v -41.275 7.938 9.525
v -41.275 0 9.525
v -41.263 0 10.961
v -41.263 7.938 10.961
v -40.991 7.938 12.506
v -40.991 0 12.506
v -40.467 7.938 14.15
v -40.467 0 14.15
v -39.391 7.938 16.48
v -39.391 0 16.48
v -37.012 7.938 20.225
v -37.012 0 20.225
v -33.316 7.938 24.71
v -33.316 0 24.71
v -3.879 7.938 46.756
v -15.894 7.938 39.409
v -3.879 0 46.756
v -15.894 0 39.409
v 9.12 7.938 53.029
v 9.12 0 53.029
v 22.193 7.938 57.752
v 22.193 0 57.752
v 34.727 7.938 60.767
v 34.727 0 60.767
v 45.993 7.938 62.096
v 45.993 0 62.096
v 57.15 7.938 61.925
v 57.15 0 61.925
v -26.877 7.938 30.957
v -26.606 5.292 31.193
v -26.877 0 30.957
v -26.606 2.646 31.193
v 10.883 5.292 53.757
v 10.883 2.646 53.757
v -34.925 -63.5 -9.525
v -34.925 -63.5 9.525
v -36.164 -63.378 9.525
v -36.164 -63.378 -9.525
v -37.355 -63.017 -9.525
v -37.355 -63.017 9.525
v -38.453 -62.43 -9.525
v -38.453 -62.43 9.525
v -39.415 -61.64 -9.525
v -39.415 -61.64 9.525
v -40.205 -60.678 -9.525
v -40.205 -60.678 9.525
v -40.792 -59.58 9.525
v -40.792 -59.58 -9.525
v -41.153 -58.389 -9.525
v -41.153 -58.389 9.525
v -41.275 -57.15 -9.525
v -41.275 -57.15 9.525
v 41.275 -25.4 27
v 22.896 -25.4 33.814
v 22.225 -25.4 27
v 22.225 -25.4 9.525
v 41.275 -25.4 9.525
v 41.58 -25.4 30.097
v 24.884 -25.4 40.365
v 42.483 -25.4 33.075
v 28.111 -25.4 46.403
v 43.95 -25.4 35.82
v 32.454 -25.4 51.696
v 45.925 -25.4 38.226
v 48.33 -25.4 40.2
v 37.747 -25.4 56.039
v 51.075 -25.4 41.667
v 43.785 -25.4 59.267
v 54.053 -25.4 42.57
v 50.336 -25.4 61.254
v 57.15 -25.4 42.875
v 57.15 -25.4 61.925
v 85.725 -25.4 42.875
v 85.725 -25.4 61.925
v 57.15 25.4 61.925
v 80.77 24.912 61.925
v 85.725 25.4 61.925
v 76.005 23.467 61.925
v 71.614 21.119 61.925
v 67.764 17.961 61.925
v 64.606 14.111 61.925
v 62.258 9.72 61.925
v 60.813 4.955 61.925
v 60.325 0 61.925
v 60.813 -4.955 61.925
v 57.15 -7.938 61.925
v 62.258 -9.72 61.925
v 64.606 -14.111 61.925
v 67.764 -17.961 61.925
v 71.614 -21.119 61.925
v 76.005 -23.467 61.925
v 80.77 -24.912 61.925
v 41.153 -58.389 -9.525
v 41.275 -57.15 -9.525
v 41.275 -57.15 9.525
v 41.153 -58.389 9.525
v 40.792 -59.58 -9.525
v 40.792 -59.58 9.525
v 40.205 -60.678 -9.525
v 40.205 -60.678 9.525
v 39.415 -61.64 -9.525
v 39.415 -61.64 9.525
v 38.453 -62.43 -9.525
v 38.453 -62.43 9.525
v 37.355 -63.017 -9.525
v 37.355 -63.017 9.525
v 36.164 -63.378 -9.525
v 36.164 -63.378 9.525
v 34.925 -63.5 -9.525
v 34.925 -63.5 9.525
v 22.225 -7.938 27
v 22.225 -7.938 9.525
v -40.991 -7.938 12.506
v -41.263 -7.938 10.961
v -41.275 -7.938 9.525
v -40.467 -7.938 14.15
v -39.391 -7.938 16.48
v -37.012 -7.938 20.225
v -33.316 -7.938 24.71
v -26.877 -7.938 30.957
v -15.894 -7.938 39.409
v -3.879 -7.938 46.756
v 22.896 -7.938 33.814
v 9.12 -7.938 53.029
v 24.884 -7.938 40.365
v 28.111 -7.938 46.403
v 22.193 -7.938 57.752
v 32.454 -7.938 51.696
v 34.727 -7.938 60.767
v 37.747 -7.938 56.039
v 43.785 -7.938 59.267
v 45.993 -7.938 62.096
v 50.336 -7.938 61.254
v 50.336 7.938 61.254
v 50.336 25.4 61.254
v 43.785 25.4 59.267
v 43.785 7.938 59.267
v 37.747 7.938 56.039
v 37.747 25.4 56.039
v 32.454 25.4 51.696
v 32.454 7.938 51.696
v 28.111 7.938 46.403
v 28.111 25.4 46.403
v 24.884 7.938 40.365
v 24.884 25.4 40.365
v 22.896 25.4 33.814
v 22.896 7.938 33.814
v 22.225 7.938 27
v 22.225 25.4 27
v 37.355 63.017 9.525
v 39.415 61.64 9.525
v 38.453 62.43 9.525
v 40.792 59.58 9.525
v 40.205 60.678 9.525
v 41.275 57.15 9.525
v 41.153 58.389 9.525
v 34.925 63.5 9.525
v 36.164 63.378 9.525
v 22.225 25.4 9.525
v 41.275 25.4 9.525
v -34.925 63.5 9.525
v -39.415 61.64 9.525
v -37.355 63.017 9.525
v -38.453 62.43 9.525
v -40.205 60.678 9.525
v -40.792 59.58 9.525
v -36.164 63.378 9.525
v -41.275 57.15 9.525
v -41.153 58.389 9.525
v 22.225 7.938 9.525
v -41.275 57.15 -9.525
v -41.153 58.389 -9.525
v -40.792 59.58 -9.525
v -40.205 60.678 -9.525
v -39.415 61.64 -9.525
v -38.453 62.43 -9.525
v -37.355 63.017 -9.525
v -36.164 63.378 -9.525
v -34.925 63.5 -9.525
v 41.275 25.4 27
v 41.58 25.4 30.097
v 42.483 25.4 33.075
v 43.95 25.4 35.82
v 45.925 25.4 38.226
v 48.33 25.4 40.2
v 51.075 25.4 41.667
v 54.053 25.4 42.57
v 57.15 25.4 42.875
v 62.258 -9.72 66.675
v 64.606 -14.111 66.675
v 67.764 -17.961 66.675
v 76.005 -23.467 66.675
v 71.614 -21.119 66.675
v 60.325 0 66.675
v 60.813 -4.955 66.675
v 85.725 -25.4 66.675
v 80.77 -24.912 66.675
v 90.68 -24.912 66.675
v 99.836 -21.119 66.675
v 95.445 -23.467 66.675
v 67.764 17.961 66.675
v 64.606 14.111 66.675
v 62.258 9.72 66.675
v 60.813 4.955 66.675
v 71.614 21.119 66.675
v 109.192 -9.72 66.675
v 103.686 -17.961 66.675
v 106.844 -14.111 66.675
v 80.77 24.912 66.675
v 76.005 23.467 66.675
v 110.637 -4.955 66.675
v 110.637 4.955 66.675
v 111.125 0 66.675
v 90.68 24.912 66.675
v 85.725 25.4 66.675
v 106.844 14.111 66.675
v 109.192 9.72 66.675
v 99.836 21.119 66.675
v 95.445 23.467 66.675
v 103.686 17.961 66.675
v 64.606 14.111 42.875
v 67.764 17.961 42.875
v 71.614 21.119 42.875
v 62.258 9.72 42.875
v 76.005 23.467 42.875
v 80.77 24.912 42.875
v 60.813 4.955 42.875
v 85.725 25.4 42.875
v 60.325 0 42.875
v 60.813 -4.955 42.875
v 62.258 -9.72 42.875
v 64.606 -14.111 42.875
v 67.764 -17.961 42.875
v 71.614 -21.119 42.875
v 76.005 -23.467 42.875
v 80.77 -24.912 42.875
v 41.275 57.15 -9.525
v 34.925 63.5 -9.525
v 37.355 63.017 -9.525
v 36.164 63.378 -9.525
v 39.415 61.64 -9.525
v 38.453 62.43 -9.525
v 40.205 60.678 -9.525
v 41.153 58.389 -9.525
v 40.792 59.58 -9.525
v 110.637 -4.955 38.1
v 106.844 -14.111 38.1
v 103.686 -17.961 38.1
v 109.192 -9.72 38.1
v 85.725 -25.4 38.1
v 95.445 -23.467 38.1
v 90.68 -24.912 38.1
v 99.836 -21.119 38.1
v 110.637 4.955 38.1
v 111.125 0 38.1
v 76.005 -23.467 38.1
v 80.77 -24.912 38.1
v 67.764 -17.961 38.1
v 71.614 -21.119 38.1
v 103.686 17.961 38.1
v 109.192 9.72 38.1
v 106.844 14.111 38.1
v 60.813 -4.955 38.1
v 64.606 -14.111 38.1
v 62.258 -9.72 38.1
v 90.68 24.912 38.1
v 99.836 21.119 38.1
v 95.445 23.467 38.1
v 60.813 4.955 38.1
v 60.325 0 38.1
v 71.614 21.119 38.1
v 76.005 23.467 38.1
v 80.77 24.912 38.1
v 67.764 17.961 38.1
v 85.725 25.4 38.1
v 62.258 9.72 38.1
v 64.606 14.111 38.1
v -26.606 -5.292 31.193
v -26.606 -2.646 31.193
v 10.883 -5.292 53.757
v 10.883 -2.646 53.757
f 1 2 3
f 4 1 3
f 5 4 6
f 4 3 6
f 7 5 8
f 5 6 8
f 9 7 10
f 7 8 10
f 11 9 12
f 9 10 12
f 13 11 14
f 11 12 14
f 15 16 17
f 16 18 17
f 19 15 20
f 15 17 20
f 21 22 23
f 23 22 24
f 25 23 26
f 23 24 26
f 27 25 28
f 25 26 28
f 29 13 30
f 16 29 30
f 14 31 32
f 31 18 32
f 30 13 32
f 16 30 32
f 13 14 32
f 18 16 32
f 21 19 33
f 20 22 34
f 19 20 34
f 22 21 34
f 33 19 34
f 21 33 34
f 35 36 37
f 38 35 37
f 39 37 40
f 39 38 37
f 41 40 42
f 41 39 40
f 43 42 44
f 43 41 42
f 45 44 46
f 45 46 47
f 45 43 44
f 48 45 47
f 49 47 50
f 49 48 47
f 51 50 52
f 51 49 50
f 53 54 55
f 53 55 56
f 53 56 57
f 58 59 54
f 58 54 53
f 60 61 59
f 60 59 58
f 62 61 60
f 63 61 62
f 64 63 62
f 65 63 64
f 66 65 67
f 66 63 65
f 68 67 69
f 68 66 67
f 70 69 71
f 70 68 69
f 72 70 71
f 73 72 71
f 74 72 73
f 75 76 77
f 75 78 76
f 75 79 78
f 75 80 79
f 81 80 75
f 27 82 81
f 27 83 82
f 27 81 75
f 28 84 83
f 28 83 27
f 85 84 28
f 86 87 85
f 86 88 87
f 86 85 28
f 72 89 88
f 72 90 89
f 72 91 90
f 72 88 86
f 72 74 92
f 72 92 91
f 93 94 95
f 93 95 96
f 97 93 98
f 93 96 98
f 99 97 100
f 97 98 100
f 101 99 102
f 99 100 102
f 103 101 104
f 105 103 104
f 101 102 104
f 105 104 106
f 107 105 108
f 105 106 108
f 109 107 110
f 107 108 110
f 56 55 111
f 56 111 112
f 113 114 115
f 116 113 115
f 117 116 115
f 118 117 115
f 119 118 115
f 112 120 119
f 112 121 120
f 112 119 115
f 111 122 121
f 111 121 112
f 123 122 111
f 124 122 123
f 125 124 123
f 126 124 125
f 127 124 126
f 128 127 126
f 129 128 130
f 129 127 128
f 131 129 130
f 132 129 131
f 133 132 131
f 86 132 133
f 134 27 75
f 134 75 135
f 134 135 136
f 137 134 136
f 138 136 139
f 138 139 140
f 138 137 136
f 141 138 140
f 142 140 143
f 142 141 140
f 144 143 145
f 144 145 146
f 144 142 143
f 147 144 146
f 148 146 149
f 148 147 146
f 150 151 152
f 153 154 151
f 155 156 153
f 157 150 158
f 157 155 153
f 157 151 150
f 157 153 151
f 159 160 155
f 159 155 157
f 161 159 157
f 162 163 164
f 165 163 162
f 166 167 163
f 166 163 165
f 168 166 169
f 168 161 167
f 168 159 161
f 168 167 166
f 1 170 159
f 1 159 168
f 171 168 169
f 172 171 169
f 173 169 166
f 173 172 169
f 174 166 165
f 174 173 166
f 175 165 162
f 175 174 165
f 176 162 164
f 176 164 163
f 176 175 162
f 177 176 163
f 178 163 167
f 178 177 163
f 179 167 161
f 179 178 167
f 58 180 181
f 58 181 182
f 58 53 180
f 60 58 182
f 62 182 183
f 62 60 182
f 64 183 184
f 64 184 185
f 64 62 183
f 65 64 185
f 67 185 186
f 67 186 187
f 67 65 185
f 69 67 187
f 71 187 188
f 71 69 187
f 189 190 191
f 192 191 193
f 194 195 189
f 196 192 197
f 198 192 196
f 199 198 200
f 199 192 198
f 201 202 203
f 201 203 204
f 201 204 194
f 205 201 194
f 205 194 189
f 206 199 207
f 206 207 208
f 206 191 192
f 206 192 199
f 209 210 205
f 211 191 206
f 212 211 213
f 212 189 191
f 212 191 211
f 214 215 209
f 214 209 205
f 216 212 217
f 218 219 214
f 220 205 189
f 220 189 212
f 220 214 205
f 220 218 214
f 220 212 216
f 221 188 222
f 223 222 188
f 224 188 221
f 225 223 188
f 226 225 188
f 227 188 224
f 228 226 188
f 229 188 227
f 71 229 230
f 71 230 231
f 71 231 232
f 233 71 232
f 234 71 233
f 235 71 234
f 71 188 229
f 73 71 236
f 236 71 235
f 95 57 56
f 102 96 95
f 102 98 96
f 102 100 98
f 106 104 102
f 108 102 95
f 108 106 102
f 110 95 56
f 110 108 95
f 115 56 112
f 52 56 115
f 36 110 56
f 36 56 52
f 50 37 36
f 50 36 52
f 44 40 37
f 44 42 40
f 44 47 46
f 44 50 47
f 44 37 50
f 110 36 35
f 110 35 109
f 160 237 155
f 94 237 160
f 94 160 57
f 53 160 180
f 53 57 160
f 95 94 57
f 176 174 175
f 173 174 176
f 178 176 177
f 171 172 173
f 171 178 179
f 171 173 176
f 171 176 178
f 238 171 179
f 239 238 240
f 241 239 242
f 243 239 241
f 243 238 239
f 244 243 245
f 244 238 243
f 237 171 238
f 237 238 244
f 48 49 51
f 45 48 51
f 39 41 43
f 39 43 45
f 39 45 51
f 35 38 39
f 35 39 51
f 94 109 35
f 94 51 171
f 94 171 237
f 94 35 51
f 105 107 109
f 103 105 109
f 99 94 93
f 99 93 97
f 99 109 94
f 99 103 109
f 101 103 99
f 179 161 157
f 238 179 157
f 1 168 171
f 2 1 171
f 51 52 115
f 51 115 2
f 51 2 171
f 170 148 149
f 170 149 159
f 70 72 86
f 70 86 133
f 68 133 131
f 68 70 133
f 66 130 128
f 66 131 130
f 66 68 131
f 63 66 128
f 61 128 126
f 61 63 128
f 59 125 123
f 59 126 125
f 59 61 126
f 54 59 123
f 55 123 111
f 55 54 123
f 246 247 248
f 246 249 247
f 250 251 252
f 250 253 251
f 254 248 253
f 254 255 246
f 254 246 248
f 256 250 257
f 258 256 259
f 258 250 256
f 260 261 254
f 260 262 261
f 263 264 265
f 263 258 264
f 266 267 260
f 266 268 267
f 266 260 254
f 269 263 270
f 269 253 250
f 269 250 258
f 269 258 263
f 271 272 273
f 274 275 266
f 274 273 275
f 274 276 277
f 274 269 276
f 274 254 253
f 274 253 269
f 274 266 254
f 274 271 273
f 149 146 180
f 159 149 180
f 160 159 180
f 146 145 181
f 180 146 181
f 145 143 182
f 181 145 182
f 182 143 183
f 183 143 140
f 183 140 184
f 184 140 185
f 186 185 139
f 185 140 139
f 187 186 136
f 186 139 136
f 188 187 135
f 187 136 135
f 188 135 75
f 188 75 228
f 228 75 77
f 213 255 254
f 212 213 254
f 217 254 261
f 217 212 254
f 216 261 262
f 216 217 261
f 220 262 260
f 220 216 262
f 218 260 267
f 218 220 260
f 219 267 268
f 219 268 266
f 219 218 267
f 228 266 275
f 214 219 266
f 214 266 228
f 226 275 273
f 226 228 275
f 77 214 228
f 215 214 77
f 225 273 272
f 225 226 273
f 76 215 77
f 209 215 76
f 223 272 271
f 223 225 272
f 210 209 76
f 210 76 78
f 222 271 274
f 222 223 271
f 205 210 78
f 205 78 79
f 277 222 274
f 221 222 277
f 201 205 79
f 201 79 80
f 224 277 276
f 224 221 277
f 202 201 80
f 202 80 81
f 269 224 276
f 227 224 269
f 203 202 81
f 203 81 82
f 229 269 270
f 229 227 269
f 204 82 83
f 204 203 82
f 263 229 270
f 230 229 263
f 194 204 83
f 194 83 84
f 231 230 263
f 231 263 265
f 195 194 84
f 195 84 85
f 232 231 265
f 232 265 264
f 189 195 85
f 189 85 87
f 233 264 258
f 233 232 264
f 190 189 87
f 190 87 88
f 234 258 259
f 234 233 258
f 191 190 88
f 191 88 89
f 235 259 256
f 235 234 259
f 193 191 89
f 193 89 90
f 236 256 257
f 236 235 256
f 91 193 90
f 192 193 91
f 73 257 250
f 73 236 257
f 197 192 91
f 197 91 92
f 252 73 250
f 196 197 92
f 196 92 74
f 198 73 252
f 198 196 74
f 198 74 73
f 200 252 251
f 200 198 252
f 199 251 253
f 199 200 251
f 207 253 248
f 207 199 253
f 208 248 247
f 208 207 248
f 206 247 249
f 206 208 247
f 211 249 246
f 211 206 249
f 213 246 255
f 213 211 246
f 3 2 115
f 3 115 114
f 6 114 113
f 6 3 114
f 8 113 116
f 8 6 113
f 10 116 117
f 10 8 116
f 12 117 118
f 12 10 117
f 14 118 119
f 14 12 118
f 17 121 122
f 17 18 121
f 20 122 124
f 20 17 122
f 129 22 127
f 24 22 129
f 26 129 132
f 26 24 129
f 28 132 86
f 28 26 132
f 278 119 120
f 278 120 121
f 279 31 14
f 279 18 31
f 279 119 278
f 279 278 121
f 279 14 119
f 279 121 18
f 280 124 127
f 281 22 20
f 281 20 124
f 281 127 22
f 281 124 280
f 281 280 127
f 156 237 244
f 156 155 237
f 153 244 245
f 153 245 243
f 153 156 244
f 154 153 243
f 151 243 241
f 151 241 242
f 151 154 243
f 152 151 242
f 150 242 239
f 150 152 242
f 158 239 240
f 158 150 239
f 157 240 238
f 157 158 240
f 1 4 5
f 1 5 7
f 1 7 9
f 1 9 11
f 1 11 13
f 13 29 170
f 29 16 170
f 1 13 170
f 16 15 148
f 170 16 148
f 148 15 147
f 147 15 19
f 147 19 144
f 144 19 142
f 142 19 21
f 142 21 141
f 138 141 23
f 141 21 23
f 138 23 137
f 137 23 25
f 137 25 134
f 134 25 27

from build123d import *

# Parameters (mm, degrees)
F1_DEPTH = 63.5
F0_W     = 25.4
F0_H     = 19.05
F2_DEPTH = 25.4
F3_DEPTH = 7.9375
F5_R     = 6.35


with BuildPart() as f1:
    # F0 (on Front) → F1 (new body, symmetric)
    with BuildSketch(Plane.XZ):
        Polygon((41.275, -9.525), (41.275, 9.525), (22.225, 9.525), (-41.275, 9.525), (-41.275, -9.525), align=None)
    extrude(amount=F1_DEPTH, both=True)

    # F0 (on Front) → F2 (join, symmetric)
    with BuildSketch(Plane.XZ):
        with Locations((73.025, 52.4002)):
            Rectangle(F0_W, F0_H)
        with BuildLine():
            Line((22.225, 9.525), (41.275, 9.525))
            Line((41.275, 9.525), (41.275, 27.0002))
            ThreePointArc((41.275, 27.0002), (45.9246798487, 38.2255201513), (57.15, 42.8752))
            Line((57.15, 42.8752), (60.325, 42.8752))
            Line((60.325, 42.8752), (60.325, 61.9252))
            Line((60.325, 61.9252), (57.15, 61.9252))
            ThreePointArc((57.15, 61.9252), (32.4542956671, 51.6959043329), (22.225, 27.0002))
            Line((22.225, 27.0002), (22.225, 9.525))
        make_face()
    extrude(amount=F2_DEPTH, both=True)

    # F0 (on Front) → F3 (join, symmetric)
    with BuildSketch(Plane.XZ):
        with BuildLine():
            Line((-41.275, 9.525), (22.225, 9.525))
            Line((22.225, 9.525), (22.225, 27.0002))
            ThreePointArc((22.225, 27.0002), (32.4542956671, 51.6959043329), (57.15, 61.9252))
            add(Edge.make_bspline(
                [(-41.275, 9.525), (-42.6979027689, 25.6473943591), (11.1759584397, 66.0527870059), (57.15, 61.9252)],
                knots=[0, 0, 0, 0, 111.5045361635, 111.5045361635, 111.5045361635, 111.5045361635], degree=3))
        make_face()
    extrude(amount=F3_DEPTH, both=True)

    # F0 (on Front) → F4 (revolve)
    with BuildSketch(Plane.XZ):
        Polygon((85.725, 61.9252), (85.725, 42.8752), (85.725, 38.1), (111.125, 38.1), (111.125, 66.675), (85.725, 66.675), align=None)
    revolve(axis=Axis((85.725, 0, 52.3875), (0, 0, 1)))

    # F5
    f5_edges = [f1.edges().sort_by_distance(p)[0] for p in [
        (41.275, -63.5, 0),
        (-41.275, -63.5, 0),
        (41.275, 63.5, 0),
        (-41.275, 63.5, 0),
    ]]
    fillet(f5_edges, radius=F5_R)


solid = f1.part
